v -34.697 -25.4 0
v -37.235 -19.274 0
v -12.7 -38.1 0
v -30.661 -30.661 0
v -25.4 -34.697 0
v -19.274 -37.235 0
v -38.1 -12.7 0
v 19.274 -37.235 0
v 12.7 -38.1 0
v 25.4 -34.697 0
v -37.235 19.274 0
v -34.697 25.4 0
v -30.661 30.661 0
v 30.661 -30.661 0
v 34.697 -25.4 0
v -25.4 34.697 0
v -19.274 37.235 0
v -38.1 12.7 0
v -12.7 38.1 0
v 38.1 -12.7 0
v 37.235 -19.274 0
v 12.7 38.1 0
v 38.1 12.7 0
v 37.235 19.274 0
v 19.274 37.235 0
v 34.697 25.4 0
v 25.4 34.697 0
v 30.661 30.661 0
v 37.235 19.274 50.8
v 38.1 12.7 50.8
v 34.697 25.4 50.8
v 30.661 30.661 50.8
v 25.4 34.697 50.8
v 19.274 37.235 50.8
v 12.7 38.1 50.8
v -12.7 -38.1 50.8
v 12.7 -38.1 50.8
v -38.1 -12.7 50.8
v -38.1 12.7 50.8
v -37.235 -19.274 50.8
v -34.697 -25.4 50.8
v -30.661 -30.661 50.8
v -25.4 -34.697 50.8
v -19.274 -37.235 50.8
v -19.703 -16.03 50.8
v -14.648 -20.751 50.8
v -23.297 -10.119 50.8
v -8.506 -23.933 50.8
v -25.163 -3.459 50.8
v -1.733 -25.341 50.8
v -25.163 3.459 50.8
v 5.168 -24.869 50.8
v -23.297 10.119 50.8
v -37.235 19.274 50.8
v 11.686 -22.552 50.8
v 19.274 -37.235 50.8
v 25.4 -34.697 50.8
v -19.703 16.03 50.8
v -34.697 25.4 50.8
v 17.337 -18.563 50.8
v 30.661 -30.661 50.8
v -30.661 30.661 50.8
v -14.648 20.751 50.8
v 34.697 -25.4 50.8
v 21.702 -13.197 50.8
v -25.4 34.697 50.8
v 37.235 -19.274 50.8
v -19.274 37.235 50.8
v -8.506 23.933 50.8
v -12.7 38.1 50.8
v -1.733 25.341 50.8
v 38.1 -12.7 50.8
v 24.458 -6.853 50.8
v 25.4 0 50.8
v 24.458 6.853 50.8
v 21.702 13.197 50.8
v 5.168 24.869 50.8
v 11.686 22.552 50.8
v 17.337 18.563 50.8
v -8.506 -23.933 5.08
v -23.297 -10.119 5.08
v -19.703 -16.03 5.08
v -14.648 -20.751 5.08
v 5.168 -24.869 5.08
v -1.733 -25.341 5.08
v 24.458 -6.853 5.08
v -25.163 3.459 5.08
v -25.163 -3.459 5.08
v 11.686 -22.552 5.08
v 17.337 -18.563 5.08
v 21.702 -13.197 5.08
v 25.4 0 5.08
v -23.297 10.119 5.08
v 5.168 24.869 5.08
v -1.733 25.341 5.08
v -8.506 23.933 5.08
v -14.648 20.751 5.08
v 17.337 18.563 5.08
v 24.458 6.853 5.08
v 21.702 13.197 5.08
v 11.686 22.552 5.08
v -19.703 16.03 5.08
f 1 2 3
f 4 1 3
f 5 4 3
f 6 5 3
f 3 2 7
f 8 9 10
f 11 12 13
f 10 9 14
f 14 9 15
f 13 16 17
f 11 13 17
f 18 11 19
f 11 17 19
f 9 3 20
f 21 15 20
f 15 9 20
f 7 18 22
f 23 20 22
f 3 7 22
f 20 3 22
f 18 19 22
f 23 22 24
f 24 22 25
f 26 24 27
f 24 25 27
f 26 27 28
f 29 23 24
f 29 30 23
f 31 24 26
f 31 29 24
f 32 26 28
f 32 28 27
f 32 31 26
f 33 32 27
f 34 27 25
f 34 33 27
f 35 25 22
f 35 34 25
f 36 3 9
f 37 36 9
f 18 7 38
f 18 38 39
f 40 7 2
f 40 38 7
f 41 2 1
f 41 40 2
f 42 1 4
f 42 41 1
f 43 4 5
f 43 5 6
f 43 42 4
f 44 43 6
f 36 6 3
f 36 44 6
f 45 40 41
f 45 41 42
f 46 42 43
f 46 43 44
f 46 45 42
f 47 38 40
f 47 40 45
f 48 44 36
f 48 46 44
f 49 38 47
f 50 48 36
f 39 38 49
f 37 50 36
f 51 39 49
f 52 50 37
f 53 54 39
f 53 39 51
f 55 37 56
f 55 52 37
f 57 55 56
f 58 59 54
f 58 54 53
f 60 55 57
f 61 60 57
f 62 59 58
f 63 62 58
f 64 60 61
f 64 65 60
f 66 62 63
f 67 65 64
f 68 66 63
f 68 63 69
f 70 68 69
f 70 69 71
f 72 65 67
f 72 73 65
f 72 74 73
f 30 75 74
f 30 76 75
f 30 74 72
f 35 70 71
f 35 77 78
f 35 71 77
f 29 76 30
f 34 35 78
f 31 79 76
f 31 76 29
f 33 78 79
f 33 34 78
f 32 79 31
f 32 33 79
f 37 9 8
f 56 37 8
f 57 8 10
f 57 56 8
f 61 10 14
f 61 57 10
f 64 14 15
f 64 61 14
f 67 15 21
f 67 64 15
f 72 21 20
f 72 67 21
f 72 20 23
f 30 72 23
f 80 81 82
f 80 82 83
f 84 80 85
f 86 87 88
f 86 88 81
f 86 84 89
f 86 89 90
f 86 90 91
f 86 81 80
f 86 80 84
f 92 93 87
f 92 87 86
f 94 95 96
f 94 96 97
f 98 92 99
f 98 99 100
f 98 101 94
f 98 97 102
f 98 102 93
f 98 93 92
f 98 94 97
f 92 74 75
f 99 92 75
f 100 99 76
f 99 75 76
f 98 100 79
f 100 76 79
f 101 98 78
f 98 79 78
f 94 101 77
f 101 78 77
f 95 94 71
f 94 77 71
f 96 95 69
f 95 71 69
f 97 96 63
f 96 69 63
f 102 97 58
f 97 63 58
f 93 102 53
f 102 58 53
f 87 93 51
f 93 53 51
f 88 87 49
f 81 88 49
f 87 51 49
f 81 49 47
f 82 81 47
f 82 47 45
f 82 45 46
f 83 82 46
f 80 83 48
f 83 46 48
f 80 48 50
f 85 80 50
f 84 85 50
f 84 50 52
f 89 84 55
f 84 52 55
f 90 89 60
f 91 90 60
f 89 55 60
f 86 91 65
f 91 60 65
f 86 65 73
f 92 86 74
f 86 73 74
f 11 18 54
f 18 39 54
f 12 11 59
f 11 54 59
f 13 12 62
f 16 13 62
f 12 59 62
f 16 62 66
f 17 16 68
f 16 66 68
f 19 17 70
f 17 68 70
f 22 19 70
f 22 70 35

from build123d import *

# Parameters (mm, degrees)
F0_W     = 76.2
F0_H     = 76.2
F1_DEPTH = 50.8
F2_R     = 25.4
F3_R     = 25.4
F4_DEPTH = 45.72


with BuildPart() as f1:
    # F0 (on Top) → F1 (new body)
    with BuildSketch(Plane.XY):
        Rectangle(F0_W, F0_H)
    extrude(amount=F1_DEPTH)

    # F2
    f2_edges = [f1.edges().sort_by_distance(p)[0] for p in [
        (-38.1, -38.1, 25.4),
        (38.1, -38.1, 25.4),
        (-38.1, 38.1, 25.4),
        (38.1, 38.1, 25.4),
    ]]
    fillet(f2_edges, radius=F2_R)

    # F3 (on face) → F4 (cut)
    with BuildSketch(Plane.XY.offset(50.8)):
        Circle(F3_R)
    extrude(amount=-F4_DEPTH, mode=Mode.SUBTRACT)


solid = f1.part
